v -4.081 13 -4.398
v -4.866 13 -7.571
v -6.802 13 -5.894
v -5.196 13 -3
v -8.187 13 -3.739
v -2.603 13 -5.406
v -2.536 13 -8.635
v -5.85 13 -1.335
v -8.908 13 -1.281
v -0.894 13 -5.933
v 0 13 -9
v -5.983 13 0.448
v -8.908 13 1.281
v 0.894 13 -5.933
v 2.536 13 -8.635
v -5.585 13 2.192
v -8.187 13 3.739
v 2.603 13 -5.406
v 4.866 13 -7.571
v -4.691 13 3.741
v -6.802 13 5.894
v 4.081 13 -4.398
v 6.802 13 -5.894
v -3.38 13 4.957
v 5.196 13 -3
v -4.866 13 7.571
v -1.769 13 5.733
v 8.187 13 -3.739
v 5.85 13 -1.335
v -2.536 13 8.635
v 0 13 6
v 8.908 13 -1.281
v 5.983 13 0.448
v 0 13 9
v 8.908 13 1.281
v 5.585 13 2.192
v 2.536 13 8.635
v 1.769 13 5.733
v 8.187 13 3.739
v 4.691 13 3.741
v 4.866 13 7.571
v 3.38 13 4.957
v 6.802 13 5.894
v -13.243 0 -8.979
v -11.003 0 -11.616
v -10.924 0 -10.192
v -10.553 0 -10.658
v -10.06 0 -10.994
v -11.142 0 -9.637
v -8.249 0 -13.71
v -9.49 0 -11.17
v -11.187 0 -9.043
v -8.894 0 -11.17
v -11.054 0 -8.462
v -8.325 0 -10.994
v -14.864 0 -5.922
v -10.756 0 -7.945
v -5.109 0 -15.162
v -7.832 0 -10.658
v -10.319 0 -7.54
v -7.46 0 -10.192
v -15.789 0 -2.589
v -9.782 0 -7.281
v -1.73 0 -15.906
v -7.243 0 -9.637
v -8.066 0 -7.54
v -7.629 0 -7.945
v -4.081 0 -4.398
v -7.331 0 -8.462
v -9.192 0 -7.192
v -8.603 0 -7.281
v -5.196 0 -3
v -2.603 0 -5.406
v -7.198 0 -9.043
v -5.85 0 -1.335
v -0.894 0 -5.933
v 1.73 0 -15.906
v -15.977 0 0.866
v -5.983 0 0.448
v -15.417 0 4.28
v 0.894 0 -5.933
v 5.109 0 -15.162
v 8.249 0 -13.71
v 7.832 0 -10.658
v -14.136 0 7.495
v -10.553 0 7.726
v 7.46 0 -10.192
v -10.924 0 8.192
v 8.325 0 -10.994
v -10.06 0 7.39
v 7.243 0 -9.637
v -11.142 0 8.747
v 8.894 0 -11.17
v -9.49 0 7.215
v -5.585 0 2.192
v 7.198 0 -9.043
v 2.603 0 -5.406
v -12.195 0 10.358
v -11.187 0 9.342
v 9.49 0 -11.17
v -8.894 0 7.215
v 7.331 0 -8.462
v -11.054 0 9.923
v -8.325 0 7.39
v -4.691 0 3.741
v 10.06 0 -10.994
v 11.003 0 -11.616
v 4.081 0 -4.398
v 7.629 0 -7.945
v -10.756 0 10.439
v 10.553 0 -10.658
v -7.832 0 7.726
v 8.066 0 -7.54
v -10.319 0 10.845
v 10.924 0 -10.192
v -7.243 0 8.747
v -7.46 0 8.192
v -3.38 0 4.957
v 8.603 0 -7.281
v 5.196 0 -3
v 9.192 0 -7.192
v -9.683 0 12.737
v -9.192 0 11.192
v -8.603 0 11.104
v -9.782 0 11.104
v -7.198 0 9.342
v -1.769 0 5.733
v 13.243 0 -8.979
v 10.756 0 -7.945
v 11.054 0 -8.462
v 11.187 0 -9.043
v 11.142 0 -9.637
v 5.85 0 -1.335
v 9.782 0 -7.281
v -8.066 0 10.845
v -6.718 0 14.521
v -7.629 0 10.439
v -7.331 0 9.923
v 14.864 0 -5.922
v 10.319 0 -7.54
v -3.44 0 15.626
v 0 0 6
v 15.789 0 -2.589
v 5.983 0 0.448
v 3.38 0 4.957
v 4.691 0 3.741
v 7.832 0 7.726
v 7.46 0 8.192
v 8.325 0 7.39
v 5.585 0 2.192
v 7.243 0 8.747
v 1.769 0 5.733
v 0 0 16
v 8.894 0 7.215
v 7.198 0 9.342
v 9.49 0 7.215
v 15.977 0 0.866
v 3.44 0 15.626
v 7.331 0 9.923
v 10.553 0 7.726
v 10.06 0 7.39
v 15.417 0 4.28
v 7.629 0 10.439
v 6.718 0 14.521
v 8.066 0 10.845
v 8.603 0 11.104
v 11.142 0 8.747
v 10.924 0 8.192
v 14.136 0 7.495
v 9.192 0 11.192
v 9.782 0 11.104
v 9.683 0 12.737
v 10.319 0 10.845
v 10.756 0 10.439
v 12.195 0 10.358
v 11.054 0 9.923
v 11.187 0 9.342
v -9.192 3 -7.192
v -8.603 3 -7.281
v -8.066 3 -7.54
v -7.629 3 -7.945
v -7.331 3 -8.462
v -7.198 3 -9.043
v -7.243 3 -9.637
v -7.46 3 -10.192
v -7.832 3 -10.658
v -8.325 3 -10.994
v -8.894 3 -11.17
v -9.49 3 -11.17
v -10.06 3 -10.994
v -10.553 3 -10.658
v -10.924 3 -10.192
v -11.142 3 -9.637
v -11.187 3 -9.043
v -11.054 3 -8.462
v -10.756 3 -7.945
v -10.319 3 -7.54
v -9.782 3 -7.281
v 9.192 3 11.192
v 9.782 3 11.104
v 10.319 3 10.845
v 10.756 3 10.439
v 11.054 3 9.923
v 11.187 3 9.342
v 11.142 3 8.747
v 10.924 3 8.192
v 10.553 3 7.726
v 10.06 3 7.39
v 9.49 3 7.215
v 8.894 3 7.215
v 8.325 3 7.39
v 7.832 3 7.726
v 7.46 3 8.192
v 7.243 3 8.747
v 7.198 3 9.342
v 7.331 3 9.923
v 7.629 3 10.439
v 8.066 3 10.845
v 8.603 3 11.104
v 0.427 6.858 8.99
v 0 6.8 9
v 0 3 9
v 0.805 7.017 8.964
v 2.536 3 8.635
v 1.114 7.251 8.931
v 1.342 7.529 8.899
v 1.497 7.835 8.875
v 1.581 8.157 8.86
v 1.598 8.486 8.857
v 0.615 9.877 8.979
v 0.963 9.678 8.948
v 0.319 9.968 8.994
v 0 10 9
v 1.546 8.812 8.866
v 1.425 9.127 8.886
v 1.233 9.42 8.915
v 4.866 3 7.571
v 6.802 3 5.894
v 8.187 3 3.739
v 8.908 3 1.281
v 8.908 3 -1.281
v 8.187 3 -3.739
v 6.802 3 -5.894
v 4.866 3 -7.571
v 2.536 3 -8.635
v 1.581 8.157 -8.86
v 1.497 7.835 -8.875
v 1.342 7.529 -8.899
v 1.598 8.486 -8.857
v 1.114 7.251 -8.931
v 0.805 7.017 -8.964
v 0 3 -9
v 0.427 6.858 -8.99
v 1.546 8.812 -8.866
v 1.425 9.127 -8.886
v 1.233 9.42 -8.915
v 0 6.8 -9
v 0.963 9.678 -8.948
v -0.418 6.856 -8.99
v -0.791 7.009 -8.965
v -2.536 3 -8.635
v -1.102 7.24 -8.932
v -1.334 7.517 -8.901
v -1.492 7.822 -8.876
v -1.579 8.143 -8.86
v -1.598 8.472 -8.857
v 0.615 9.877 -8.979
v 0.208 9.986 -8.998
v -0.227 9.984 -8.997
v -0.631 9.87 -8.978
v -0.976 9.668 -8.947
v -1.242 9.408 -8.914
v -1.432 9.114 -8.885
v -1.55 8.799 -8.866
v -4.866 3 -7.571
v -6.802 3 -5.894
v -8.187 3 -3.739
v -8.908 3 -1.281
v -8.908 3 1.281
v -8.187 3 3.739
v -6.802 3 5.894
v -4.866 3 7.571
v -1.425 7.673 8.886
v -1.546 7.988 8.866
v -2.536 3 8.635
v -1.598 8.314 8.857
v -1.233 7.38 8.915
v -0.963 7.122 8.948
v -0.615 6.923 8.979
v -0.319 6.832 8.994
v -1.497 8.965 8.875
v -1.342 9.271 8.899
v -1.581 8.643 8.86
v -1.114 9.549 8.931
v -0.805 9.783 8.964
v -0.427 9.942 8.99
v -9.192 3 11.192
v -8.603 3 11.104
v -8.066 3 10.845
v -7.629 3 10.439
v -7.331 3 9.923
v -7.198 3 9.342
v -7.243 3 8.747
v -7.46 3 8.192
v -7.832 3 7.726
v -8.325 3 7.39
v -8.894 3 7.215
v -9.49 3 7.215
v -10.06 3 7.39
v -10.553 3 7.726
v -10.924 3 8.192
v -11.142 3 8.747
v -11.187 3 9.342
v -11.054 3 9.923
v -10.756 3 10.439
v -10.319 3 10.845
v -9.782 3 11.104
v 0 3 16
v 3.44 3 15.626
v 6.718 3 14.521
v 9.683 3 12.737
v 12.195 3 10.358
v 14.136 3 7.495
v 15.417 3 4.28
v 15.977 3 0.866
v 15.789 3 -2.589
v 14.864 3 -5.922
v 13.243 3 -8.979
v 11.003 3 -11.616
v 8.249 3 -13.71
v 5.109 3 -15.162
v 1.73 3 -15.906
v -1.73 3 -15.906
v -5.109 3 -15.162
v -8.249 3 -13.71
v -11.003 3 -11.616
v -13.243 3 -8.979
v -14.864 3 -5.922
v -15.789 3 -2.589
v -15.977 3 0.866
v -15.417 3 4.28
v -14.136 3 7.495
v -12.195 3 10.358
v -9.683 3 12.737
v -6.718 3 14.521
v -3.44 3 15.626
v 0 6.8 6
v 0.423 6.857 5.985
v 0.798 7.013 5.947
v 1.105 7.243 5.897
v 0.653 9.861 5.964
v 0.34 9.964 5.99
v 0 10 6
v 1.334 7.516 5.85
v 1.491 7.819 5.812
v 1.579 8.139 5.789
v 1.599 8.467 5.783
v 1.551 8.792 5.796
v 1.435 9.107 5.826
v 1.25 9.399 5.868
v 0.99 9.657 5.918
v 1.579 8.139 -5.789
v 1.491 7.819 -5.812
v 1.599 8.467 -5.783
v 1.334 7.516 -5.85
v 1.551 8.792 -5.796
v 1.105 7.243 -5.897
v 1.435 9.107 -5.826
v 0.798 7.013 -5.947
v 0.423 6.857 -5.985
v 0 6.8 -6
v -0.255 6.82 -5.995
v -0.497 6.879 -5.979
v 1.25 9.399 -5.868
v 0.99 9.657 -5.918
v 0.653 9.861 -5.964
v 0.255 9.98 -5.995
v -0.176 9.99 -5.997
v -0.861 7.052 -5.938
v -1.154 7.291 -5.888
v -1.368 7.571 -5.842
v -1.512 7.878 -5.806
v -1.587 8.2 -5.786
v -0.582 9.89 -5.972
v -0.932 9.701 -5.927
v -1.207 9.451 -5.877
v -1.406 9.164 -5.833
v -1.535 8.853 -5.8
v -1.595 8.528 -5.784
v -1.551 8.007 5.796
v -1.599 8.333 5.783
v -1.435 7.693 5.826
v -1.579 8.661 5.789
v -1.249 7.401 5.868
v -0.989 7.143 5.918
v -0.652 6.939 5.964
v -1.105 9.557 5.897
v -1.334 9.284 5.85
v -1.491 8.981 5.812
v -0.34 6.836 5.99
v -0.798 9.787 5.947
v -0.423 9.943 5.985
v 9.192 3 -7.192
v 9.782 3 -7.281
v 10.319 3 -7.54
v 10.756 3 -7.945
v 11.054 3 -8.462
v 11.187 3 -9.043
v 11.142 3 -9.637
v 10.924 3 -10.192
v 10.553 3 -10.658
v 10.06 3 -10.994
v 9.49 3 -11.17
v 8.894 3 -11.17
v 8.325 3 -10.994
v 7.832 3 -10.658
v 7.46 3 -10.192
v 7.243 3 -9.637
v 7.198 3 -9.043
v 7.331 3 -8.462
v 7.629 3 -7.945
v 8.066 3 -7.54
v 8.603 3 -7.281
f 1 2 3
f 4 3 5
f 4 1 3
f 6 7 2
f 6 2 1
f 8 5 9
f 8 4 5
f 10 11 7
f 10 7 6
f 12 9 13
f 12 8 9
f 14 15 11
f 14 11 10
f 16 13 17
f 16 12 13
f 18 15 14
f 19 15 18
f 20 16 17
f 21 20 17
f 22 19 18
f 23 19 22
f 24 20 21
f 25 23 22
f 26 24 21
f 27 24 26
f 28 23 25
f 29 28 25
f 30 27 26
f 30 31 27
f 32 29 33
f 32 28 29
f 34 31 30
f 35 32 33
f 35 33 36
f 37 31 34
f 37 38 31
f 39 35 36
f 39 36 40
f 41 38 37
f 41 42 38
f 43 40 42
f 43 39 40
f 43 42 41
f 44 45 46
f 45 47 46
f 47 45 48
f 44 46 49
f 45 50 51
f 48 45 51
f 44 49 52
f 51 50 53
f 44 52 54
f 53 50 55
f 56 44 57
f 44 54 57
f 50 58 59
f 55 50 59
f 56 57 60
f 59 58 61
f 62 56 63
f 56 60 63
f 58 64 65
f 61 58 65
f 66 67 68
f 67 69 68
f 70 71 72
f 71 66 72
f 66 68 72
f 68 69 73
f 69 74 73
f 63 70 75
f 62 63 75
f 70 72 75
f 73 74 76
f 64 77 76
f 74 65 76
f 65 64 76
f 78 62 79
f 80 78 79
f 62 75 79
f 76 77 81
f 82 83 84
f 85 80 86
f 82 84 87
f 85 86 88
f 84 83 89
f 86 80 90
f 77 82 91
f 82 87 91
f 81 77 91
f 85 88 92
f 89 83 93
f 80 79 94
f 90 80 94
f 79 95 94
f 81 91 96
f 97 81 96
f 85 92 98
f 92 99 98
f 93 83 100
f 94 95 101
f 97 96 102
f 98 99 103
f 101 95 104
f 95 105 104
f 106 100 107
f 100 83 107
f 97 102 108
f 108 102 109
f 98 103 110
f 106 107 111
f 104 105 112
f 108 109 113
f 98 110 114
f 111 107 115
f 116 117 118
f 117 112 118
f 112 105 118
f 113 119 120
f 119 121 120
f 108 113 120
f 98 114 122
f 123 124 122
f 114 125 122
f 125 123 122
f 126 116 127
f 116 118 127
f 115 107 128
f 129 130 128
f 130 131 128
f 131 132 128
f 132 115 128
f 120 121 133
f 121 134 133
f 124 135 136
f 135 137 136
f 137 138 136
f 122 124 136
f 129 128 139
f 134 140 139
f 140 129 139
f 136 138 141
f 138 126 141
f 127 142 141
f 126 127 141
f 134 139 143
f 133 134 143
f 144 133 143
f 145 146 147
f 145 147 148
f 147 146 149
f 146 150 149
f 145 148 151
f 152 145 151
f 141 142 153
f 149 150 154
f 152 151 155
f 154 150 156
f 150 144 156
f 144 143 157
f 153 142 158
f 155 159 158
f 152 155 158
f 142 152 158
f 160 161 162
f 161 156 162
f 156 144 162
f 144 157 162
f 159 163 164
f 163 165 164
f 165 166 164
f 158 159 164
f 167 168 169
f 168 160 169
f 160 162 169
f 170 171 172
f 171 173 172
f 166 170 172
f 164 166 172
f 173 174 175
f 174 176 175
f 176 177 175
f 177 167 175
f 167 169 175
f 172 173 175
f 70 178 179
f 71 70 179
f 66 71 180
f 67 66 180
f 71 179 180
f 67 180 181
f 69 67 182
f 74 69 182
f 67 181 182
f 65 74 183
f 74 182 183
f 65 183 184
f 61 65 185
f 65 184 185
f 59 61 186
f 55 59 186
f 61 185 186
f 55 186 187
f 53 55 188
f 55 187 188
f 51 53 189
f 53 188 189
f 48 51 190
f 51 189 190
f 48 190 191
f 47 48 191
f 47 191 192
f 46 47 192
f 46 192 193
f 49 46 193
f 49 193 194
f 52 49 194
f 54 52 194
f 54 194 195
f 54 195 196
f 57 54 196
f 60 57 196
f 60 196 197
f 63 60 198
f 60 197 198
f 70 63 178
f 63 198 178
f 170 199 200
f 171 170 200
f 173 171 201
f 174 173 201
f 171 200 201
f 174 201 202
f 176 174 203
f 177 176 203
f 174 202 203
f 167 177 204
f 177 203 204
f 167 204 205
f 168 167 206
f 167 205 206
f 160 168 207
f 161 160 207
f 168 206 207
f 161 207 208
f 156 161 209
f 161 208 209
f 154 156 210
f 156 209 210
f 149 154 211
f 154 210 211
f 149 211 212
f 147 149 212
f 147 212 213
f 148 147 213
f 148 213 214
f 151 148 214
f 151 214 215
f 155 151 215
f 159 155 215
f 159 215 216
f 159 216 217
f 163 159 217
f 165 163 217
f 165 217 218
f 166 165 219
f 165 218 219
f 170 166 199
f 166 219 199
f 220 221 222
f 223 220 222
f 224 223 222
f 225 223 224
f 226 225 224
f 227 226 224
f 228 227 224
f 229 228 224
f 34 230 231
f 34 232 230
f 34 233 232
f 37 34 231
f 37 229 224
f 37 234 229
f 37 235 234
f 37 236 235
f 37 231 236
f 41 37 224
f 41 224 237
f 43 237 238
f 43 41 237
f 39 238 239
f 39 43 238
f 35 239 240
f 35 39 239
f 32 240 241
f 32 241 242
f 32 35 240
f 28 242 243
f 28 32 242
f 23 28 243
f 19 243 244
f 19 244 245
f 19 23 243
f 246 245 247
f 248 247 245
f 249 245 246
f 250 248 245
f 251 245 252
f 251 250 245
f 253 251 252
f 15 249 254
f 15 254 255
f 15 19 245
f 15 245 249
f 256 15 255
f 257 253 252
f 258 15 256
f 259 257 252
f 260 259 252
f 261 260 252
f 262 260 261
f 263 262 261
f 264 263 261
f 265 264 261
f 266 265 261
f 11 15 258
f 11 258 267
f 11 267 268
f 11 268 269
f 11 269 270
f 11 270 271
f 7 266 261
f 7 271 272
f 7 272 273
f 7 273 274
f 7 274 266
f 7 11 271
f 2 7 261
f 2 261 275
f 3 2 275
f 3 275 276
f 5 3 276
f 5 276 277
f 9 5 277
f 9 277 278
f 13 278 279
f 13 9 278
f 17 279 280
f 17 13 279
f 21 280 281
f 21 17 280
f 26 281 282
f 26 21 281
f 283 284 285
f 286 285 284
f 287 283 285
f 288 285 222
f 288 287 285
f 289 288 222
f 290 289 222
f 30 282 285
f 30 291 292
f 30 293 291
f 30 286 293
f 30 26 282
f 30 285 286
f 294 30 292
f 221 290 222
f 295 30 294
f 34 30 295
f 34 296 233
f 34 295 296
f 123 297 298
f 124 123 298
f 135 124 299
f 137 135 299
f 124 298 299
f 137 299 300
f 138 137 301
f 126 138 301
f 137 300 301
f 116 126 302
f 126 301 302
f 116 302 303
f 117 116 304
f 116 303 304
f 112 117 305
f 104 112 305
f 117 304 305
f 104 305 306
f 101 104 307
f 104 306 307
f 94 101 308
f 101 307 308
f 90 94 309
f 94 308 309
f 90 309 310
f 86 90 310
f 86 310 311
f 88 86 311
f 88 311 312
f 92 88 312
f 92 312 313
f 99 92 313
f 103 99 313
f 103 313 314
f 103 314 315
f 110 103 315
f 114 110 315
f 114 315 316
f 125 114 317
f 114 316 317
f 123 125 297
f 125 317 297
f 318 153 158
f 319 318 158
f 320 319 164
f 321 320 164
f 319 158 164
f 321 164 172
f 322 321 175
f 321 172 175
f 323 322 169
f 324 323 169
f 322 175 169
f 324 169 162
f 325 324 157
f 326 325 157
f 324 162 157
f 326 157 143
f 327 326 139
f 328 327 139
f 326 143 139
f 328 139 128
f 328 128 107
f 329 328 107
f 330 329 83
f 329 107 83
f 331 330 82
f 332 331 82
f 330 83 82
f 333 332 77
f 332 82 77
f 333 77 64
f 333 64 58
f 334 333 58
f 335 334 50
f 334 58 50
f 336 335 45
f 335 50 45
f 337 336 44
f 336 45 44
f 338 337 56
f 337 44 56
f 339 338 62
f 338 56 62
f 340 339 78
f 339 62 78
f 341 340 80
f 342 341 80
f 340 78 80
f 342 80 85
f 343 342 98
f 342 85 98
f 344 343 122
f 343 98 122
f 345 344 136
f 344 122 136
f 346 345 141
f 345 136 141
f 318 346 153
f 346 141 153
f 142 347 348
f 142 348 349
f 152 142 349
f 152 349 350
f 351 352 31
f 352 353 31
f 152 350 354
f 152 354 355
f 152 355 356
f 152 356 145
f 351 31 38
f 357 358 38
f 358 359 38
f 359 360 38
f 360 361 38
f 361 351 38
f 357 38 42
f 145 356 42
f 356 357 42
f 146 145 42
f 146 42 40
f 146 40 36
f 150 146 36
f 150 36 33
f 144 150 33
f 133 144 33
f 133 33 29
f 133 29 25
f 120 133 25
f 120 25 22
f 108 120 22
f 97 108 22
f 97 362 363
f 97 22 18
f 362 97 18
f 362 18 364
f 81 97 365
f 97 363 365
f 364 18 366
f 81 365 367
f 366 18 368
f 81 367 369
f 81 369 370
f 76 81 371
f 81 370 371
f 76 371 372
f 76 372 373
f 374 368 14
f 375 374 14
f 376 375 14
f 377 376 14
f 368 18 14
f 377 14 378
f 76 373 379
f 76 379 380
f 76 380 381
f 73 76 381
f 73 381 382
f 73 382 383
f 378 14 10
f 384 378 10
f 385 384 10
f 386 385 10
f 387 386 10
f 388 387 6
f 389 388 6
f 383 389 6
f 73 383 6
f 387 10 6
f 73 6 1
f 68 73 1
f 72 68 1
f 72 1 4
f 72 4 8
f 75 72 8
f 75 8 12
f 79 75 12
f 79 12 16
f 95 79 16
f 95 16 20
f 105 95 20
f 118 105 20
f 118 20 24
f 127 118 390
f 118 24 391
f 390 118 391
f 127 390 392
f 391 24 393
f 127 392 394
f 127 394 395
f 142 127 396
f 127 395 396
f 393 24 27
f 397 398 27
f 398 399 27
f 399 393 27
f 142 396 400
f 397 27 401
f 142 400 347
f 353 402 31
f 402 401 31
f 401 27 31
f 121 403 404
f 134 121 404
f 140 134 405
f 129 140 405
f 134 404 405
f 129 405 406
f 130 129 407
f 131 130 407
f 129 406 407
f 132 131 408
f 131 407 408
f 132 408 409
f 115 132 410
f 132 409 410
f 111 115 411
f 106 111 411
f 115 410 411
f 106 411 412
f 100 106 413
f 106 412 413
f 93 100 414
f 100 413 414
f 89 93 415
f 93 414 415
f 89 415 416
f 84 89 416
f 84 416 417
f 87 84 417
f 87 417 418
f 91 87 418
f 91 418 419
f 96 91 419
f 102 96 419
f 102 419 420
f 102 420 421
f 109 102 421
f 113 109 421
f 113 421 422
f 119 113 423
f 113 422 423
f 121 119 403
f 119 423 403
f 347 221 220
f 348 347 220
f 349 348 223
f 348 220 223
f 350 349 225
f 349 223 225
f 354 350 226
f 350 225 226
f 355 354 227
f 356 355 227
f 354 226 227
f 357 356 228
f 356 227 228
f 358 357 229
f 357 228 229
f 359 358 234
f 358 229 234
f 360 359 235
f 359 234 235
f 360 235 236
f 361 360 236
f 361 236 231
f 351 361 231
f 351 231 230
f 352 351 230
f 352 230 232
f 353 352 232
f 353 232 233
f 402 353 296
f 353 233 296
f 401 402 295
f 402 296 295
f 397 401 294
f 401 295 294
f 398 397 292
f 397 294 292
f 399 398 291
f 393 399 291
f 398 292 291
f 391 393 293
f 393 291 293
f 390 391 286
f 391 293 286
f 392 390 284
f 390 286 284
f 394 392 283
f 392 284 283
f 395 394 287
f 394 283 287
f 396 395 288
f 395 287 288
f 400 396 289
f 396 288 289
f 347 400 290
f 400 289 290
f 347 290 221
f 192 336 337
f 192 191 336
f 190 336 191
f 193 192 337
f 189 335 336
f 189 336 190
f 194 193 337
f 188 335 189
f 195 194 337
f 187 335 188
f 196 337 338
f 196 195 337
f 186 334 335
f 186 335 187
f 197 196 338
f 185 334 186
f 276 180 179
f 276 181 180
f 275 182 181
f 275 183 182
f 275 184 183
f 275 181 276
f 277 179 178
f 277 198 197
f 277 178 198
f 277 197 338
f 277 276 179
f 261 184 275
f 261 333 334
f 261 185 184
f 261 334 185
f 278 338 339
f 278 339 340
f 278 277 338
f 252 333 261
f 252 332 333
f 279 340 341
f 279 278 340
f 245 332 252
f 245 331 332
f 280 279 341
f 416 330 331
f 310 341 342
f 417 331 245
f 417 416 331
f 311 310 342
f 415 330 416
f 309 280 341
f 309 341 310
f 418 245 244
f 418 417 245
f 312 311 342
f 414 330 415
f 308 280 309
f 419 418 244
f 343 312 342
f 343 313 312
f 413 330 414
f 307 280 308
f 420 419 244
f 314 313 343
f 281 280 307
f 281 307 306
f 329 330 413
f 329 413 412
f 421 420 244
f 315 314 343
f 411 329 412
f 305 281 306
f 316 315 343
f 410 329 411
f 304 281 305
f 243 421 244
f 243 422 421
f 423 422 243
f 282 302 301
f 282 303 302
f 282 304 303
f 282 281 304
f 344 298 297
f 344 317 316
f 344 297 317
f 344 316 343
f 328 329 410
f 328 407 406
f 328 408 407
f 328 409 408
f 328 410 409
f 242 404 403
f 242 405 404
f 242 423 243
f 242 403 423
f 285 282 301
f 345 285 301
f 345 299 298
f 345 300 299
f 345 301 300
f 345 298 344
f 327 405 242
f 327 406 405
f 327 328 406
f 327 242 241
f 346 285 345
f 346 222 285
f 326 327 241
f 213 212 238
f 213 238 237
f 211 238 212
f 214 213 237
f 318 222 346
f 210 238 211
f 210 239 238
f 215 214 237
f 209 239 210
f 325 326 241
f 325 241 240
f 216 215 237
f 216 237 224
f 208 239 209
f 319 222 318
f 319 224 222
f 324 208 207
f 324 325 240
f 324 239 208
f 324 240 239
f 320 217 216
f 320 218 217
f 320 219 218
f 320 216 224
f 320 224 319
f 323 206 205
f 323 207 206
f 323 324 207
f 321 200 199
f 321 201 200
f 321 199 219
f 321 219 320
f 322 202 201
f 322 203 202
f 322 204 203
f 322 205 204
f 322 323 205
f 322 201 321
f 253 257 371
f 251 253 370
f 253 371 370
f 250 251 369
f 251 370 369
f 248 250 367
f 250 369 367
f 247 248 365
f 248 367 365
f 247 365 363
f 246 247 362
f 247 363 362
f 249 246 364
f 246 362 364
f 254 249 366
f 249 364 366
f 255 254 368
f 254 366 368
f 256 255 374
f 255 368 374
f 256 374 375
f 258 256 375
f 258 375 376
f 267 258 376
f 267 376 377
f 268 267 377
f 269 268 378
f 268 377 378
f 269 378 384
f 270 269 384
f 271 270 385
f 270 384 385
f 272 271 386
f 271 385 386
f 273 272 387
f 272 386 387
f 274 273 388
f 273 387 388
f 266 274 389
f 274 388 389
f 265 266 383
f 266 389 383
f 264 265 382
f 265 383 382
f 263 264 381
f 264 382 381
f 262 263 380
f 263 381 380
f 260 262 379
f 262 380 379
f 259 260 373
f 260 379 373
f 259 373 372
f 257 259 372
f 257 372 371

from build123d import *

# Parameters (mm, degrees)
SKETCH2_R           = 16
BOSS_EXTRUDE1_DEPTH = 3
SKETCH3_R           = 6
SKETCH3_R_2         = 2
CUT_EXTRUDE1_DEPTH  = 3
BOSS_EXTRUDE2_START = 10
SKETCH4_R           = 9
SKETCH4_R_2         = 6
BOSS_EXTRUDE2_DEPTH = 10
SKETCH5_R           = 1.6
CUT_EXTRUDE2_DEPTH  = 10


with BuildPart() as part:
    # Sketch2 → Boss-Extrude1 (new body)
    with BuildSketch(Plane(origin=(0, 0, 0), x_dir=(1, 0, 0), z_dir=(0, 1, 0))):
        Circle(SKETCH2_R)
    extrude(amount=BOSS_EXTRUDE1_DEPTH)

    # Sketch3 → Cut-Extrude1 (cut)
    with BuildSketch(Plane(origin=(0, 3, 0), x_dir=(1, 0, 0), z_dir=(0, 1, 0))):
        Circle(SKETCH3_R)
        with Locations((-9.192388155, 9.192388155)):
            Circle(SKETCH3_R_2)
        with Locations((9.192388155, 9.192388155)):
            Circle(SKETCH3_R_2)
        with Locations((9.192388155, -9.192388155)):
            Circle(SKETCH3_R_2)
        with Locations((-9.192388155, -9.192388155)):
            Circle(SKETCH3_R_2)
    extrude(amount=-CUT_EXTRUDE1_DEPTH, mode=Mode.SUBTRACT)

    # Sketch4 → Boss-Extrude2 (add)
    with BuildSketch(Plane(origin=(0, 3, 0), x_dir=(1, 0, 0), z_dir=(0, 1, 0)).offset(BOSS_EXTRUDE2_START)):
        Circle(SKETCH4_R)
        Circle(SKETCH4_R_2, mode=Mode.SUBTRACT)
    extrude(amount=-BOSS_EXTRUDE2_DEPTH)

    # Sketch5 → Cut-Extrude2 (cut, symmetric)
    with BuildSketch(Plane.XY):
        with Locations((0, 8.4)):
            Circle(SKETCH5_R)
    extrude(amount=CUT_EXTRUDE2_DEPTH, both=True, mode=Mode.SUBTRACT)


solid = part.part
